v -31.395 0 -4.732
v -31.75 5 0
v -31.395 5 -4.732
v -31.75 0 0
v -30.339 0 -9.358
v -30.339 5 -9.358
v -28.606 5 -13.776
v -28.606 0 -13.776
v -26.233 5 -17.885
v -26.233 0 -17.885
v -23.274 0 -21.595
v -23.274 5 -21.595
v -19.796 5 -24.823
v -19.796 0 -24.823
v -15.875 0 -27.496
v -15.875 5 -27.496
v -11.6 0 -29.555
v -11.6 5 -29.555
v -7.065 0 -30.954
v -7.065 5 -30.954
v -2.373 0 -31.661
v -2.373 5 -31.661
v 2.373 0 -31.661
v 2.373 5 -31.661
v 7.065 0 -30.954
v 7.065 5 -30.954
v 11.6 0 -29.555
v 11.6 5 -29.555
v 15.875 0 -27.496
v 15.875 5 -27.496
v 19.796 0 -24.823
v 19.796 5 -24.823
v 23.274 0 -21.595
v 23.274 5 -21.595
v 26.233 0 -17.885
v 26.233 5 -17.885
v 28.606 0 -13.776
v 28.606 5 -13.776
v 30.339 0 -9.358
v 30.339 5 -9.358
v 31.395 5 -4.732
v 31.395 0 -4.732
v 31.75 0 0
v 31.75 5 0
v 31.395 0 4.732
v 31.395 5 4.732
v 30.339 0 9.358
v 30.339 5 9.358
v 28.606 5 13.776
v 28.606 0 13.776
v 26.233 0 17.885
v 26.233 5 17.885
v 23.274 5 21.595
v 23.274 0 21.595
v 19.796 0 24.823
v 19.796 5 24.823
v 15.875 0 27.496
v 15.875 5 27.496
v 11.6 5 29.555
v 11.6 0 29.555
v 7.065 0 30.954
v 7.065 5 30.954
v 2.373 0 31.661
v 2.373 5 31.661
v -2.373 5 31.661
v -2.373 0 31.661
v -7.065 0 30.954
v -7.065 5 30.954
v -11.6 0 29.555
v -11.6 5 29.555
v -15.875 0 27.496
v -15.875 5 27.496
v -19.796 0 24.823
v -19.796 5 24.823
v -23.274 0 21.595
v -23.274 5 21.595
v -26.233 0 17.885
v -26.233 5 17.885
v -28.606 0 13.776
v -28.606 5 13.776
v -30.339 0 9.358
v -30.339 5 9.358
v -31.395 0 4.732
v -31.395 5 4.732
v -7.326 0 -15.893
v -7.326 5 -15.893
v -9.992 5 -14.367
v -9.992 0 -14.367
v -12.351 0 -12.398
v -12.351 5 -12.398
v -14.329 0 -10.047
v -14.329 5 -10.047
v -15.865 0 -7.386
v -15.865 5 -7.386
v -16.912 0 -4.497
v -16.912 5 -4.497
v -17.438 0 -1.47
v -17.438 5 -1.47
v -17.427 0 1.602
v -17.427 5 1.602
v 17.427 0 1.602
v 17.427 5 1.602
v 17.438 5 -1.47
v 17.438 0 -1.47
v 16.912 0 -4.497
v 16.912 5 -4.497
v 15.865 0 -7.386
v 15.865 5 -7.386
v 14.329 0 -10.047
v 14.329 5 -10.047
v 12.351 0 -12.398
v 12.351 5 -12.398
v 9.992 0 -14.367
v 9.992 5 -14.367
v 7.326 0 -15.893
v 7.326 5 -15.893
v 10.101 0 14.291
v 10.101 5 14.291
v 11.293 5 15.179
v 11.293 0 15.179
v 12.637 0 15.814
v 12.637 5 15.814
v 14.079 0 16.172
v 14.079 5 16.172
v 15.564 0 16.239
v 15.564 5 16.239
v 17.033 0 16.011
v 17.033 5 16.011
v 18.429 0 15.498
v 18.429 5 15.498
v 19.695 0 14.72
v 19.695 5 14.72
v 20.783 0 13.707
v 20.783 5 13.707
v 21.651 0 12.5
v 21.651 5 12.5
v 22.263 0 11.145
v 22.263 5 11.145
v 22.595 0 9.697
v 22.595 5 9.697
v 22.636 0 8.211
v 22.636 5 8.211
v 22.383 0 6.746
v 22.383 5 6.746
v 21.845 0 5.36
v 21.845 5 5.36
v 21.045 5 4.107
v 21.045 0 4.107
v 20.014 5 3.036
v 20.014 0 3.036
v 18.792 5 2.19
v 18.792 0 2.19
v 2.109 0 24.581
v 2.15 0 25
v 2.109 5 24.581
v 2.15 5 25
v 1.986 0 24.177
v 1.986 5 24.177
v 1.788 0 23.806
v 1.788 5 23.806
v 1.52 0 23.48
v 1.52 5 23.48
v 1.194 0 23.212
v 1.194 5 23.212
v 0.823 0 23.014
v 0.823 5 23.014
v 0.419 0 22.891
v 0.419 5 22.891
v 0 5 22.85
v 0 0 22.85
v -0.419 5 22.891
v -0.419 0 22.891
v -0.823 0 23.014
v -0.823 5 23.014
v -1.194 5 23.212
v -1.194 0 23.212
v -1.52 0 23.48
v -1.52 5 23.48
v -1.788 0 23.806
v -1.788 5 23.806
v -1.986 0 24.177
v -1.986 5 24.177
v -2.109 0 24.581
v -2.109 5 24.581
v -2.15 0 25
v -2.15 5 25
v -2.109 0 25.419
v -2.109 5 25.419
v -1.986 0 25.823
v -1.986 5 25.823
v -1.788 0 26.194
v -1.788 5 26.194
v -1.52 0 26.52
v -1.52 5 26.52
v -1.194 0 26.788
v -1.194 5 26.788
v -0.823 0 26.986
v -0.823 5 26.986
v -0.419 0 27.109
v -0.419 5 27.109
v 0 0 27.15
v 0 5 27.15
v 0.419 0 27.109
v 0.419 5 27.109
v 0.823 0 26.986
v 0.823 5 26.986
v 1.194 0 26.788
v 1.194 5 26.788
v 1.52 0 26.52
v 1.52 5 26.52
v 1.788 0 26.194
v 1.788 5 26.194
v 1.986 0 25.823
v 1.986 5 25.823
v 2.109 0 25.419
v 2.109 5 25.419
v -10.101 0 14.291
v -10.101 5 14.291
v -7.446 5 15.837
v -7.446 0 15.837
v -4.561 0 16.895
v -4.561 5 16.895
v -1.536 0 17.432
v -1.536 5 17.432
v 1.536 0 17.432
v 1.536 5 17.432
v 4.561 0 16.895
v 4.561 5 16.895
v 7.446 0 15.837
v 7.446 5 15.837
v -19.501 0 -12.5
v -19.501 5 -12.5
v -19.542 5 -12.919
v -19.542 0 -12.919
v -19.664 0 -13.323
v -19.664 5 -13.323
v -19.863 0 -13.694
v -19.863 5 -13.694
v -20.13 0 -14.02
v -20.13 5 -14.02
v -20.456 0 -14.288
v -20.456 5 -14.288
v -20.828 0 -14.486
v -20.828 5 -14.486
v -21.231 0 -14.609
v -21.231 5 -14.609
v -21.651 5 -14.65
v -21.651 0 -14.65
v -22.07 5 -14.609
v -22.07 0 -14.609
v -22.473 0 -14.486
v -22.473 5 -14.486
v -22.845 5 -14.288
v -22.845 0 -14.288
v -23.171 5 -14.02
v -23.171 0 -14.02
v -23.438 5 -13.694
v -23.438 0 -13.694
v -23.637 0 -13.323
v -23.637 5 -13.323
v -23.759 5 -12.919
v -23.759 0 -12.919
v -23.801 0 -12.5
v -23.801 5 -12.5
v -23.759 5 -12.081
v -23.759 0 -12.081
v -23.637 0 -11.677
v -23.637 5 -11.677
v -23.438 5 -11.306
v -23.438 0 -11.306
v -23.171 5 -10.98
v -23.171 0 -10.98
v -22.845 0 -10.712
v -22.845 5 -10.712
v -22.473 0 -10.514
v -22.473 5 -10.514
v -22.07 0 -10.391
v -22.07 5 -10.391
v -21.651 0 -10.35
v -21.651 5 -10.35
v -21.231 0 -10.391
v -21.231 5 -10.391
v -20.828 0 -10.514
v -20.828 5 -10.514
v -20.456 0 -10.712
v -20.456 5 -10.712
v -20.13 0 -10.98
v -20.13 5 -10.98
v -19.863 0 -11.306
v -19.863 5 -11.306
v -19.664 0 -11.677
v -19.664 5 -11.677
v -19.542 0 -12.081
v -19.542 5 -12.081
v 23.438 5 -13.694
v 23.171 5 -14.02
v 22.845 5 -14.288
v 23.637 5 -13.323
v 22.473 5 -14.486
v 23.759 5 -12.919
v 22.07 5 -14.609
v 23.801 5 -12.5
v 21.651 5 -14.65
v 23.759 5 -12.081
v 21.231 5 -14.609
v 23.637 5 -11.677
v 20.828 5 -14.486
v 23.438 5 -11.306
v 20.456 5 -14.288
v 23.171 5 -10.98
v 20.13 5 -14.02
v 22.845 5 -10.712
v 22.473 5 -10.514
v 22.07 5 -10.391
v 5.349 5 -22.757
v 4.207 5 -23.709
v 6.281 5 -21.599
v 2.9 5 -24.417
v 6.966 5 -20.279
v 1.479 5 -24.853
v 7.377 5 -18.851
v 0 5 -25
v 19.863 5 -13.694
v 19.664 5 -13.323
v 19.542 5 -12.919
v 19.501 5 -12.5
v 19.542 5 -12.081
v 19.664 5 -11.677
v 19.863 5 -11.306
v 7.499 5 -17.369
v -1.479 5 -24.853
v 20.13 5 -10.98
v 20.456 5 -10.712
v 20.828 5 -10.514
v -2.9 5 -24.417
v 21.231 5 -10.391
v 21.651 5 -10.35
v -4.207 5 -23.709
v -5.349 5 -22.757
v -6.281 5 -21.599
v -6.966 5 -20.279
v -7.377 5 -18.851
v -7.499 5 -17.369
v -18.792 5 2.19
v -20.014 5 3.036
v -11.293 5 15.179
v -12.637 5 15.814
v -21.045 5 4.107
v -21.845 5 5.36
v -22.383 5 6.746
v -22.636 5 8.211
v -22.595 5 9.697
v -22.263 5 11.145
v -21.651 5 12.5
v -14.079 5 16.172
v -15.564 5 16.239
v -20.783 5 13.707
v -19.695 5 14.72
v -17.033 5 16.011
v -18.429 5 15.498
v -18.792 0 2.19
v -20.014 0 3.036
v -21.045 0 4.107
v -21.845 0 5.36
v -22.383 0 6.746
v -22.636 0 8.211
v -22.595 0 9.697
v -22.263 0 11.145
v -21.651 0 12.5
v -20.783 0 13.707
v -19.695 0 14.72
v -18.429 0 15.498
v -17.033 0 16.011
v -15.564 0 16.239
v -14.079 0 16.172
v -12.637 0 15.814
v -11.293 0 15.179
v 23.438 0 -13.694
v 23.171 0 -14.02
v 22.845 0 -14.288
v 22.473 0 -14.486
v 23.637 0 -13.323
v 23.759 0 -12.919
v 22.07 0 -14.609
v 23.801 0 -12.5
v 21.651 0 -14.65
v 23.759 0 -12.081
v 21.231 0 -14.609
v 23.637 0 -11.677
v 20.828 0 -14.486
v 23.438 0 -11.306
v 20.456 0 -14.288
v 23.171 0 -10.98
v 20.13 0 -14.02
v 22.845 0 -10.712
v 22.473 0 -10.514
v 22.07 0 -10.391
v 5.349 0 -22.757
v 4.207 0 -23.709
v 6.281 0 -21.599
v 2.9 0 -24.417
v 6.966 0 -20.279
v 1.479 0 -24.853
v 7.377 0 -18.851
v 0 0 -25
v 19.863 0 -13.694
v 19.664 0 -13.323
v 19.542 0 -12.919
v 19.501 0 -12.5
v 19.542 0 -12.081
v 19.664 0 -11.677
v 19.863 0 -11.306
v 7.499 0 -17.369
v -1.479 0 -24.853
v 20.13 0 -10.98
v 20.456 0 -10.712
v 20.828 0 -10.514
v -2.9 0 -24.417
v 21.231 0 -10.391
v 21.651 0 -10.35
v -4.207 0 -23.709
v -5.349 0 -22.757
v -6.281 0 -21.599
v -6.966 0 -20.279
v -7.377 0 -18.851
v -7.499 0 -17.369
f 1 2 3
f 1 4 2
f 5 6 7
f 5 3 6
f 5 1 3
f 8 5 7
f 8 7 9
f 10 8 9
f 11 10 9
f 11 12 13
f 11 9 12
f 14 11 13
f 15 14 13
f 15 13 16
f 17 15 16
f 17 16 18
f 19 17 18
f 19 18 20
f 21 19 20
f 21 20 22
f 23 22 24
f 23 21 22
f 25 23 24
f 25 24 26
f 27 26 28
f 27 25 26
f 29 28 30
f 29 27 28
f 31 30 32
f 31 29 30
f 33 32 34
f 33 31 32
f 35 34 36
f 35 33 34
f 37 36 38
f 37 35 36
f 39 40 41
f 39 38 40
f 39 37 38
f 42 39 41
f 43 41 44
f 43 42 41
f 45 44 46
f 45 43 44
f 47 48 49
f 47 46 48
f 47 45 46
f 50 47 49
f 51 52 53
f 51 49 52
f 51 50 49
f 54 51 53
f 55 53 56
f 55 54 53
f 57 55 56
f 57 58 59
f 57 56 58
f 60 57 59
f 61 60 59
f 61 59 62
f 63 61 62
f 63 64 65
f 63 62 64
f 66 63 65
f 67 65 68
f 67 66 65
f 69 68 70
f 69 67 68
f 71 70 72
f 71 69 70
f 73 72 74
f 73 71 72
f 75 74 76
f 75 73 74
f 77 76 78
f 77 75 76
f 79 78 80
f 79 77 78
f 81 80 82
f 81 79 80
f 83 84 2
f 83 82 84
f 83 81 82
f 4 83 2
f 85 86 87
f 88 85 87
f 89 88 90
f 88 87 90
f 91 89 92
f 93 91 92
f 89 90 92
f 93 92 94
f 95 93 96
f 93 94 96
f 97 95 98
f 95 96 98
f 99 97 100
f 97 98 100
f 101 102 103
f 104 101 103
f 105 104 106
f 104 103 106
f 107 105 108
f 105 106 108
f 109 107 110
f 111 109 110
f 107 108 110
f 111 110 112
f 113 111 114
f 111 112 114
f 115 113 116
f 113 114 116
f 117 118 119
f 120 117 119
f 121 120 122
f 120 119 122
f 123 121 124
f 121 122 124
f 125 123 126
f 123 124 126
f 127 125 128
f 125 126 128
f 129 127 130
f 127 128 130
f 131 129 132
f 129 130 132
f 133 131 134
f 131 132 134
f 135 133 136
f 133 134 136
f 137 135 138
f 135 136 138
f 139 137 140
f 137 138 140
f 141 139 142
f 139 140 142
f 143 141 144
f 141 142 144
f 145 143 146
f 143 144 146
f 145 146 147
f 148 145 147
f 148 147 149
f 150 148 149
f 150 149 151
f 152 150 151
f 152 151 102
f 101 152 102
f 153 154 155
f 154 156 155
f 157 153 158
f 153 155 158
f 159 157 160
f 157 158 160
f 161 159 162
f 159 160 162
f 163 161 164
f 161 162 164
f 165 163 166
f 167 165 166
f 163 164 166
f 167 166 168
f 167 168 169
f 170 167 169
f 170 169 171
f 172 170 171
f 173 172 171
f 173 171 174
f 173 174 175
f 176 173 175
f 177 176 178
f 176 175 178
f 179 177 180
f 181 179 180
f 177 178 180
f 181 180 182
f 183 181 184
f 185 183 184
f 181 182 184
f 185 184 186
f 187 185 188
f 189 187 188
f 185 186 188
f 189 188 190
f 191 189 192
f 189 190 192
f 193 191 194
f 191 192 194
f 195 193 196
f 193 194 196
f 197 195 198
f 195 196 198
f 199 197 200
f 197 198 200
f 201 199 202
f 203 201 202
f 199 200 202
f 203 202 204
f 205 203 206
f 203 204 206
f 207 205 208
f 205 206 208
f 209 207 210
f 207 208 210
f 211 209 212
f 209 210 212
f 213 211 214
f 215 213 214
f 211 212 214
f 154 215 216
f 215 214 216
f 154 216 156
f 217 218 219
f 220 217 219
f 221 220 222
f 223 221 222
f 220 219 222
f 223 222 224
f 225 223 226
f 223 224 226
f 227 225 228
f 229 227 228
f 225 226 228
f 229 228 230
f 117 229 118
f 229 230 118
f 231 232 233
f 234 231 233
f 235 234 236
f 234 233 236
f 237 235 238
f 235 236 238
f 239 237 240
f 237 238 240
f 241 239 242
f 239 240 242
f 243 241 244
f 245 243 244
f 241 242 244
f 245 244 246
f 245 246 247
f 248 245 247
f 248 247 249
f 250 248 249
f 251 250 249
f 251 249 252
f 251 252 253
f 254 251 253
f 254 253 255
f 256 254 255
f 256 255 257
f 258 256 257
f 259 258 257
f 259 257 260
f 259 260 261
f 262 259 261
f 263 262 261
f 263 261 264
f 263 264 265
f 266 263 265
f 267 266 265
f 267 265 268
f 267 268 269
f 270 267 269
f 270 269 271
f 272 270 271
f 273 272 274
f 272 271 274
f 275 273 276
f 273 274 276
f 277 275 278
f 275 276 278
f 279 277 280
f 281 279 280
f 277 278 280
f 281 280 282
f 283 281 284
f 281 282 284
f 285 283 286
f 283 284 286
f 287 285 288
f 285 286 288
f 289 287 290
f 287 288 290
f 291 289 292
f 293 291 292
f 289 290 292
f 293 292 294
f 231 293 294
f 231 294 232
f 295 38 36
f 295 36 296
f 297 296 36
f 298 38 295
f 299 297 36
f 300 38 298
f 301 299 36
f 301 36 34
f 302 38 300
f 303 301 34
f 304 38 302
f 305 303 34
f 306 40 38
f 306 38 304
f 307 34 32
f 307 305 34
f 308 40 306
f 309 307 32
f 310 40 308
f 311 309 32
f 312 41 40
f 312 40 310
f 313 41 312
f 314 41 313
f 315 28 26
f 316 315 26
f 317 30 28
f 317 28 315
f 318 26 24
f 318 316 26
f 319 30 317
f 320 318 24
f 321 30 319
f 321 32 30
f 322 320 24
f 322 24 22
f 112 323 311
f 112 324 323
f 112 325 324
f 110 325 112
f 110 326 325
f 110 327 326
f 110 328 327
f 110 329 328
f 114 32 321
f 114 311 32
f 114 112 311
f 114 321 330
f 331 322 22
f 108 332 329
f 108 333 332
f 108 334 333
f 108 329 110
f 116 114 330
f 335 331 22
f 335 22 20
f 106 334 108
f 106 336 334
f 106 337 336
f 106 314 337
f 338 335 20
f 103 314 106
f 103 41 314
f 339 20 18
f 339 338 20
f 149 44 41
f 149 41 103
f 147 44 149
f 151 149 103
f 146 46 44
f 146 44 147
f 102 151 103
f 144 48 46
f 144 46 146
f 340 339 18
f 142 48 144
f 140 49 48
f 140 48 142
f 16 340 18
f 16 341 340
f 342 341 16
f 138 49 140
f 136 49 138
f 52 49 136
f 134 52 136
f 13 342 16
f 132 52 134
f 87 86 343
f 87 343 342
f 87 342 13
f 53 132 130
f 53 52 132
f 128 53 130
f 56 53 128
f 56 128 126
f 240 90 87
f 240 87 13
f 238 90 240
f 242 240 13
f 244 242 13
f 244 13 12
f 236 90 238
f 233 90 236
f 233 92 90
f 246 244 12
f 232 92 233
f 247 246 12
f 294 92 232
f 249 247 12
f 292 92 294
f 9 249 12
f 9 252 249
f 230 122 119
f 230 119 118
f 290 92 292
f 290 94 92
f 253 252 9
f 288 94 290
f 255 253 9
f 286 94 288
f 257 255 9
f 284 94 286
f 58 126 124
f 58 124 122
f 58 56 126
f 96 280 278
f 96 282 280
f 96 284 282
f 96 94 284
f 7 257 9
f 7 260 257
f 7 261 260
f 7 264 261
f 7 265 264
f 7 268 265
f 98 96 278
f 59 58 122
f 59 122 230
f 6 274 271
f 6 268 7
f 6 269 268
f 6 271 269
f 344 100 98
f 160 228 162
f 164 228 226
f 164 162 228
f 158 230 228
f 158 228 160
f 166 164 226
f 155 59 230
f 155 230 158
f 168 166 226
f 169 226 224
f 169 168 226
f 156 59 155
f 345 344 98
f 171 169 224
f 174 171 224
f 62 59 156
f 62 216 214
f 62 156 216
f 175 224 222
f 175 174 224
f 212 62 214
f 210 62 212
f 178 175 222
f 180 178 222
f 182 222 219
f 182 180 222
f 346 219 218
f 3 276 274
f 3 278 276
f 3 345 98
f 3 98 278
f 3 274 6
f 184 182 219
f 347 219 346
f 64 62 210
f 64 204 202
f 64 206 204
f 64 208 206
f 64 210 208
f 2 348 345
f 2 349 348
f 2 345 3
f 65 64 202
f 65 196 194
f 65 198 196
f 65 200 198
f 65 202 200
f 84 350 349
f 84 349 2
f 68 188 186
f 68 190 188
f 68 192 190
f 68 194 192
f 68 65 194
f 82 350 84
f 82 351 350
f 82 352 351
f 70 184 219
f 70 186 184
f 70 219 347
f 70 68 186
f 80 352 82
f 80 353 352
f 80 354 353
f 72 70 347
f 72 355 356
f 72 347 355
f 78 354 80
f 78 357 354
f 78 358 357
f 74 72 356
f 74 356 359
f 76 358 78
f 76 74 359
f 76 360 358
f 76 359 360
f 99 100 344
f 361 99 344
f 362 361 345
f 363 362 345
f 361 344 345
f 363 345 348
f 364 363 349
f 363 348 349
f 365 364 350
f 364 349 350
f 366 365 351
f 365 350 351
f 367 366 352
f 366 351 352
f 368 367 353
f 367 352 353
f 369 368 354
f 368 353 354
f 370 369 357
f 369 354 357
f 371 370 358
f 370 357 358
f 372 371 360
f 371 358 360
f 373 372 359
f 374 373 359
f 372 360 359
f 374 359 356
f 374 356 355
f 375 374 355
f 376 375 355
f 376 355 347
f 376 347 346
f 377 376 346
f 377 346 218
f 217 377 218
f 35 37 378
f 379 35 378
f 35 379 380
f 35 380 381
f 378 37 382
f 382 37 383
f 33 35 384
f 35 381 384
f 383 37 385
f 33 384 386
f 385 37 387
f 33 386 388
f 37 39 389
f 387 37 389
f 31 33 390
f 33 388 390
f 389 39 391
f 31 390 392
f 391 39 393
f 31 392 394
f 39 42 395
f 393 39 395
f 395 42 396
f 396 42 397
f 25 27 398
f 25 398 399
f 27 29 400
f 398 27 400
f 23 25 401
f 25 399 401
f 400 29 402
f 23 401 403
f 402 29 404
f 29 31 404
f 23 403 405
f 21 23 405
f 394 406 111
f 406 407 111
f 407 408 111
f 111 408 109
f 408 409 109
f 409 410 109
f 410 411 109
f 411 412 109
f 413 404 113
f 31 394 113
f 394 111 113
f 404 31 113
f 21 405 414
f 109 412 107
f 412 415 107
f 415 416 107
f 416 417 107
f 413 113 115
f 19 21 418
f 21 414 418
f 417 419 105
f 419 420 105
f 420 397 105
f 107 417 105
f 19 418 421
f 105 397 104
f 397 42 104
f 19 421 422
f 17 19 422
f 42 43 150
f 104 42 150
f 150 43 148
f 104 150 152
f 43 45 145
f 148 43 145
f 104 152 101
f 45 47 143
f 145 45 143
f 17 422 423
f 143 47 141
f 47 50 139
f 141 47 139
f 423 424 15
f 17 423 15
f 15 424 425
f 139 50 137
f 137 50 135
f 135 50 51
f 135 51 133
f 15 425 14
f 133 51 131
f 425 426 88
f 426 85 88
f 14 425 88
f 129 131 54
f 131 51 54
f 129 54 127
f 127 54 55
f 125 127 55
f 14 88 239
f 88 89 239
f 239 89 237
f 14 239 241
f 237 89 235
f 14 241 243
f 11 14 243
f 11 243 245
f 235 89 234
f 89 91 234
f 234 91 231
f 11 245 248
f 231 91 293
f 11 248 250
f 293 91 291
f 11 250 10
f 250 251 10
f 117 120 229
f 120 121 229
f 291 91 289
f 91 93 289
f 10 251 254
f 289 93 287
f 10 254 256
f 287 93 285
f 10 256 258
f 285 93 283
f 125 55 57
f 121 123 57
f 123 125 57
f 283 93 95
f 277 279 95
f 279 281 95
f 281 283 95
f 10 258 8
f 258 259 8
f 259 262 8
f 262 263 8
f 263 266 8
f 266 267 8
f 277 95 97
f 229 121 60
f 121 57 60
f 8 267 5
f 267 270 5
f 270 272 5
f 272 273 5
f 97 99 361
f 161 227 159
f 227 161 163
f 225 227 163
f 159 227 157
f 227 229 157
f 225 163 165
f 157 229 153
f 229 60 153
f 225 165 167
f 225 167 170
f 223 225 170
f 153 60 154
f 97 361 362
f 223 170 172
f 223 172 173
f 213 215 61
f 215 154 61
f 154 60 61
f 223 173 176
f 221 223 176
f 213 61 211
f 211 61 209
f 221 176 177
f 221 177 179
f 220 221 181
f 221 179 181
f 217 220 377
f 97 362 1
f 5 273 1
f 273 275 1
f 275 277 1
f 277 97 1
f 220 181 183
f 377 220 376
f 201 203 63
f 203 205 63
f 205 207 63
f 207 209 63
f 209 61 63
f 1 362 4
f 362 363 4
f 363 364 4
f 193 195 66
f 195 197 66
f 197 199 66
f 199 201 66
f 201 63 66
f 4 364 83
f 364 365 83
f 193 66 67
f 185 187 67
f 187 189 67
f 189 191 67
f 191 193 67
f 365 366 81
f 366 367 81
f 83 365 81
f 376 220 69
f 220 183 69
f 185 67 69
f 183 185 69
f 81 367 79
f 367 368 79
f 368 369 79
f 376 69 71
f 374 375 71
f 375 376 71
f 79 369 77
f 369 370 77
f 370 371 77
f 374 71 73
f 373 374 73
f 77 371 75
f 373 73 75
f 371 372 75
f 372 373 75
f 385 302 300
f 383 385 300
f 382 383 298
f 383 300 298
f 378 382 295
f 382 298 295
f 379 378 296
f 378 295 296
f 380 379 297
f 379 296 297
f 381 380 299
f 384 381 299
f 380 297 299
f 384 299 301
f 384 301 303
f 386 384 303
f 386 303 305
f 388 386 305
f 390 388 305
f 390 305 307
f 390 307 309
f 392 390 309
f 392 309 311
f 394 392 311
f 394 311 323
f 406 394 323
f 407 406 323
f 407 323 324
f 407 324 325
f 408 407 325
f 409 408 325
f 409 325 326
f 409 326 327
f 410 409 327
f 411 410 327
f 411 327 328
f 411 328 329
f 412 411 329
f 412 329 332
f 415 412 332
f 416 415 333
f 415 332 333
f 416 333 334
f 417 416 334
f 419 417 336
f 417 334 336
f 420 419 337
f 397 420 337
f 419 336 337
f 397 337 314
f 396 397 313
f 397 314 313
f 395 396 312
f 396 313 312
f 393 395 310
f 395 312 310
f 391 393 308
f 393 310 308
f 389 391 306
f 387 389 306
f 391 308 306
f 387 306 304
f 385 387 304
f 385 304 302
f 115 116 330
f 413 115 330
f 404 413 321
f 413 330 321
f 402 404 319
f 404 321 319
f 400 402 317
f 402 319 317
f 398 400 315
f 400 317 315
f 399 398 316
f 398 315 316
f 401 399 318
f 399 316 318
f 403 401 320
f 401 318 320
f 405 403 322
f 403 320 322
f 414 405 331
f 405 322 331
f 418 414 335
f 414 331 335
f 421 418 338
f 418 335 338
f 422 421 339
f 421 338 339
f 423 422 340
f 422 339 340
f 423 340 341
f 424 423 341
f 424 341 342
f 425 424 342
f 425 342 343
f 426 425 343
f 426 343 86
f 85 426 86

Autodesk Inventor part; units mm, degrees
ref_plane "YZ Plane" through (0, 0, 0) normal (1, 0, 0) x (0, 1, 0)
ref_plane "XZ Plane" through (0, 0, 0) normal (0, 1, 0) x (-1, 0, 0)
ref_plane "XY Plane" through (0, 0, 0) normal (0, 0, 1) x (1, 0, 0)
sketch "スケッチ1" plane through (0, 0, 0) normal (0, 1, 0) x (-1, 0, 0)
  circle A0 centre (0, 0) radius 31.75
  dimension "d0" = 63.5
extrude "押し出し1" add sketch "スケッチ1" along normal blind 5
sketch "スケッチ4" plane through (0, 5, 0) normal (0, 1, 0) x (1, 0, 0)
  circle A0 centre (0, 0) radius 17.5
  dimension "d9" = 35
extrude "押し出し4" cut sketch "スケッチ4" against normal through all
sketch "スケッチ5" plane through (0, 5, 0) normal (0, 1, 0) x (1, 0, 0)
  circle A0 centre (0, 0) radius 17.5 projected
  circle A1 centre (0, 17.5) radius 7.5
  circle A2 centre (-15.1554, -8.75) radius 7.5
  circle A3 centre (15.1554, -8.75) radius 7.5
  point P0 (7.3258, 15.8929)
  point P1 (-7.3258, 15.8929)
  point P2 (-10.1007, -14.2907)
  point P3 (-17.4265, -1.6021)
  point P4 (10.1007, -14.2907)
  point P5 (17.4265, -1.6021)
  dimension "d12" = 15
  dimension "d30" = 360
extrude "押し出し5" cut sketch "スケッチ5" against normal through all contours A0 A1 | A3 A0 | A0 A2 picked at (-2.636, 19.4451) picked at (15.4225, -12.052) picked at (-18.1566, -7.4199)
sketch "スケッチ6" plane through (0, 5, 0) normal (0, 1, 0) x (1, 0, 0)
  circle A0 centre (0, 0) radius 25 construction
  circle A1 centre (21.6506, 12.5) radius 2.15
  line L0 (0, 0) -> (21.6506, 12.5) construction
  line L1 (0, 0) -> (35.9214, 0) construction
  circle A2 centre (-21.6506, 12.5) radius 2.15
  circle A3 centre (0, -25) radius 2.15
  dimension "d19" = 50
  dimension "d20" = 4.3
  dimension "d21" = 30
  dimension "d24" = 360
extrude "押し出し6" cut sketch "スケッチ6" against normal through all
properties part number "B_probe_bearing" material "PAEK 樹脂"
